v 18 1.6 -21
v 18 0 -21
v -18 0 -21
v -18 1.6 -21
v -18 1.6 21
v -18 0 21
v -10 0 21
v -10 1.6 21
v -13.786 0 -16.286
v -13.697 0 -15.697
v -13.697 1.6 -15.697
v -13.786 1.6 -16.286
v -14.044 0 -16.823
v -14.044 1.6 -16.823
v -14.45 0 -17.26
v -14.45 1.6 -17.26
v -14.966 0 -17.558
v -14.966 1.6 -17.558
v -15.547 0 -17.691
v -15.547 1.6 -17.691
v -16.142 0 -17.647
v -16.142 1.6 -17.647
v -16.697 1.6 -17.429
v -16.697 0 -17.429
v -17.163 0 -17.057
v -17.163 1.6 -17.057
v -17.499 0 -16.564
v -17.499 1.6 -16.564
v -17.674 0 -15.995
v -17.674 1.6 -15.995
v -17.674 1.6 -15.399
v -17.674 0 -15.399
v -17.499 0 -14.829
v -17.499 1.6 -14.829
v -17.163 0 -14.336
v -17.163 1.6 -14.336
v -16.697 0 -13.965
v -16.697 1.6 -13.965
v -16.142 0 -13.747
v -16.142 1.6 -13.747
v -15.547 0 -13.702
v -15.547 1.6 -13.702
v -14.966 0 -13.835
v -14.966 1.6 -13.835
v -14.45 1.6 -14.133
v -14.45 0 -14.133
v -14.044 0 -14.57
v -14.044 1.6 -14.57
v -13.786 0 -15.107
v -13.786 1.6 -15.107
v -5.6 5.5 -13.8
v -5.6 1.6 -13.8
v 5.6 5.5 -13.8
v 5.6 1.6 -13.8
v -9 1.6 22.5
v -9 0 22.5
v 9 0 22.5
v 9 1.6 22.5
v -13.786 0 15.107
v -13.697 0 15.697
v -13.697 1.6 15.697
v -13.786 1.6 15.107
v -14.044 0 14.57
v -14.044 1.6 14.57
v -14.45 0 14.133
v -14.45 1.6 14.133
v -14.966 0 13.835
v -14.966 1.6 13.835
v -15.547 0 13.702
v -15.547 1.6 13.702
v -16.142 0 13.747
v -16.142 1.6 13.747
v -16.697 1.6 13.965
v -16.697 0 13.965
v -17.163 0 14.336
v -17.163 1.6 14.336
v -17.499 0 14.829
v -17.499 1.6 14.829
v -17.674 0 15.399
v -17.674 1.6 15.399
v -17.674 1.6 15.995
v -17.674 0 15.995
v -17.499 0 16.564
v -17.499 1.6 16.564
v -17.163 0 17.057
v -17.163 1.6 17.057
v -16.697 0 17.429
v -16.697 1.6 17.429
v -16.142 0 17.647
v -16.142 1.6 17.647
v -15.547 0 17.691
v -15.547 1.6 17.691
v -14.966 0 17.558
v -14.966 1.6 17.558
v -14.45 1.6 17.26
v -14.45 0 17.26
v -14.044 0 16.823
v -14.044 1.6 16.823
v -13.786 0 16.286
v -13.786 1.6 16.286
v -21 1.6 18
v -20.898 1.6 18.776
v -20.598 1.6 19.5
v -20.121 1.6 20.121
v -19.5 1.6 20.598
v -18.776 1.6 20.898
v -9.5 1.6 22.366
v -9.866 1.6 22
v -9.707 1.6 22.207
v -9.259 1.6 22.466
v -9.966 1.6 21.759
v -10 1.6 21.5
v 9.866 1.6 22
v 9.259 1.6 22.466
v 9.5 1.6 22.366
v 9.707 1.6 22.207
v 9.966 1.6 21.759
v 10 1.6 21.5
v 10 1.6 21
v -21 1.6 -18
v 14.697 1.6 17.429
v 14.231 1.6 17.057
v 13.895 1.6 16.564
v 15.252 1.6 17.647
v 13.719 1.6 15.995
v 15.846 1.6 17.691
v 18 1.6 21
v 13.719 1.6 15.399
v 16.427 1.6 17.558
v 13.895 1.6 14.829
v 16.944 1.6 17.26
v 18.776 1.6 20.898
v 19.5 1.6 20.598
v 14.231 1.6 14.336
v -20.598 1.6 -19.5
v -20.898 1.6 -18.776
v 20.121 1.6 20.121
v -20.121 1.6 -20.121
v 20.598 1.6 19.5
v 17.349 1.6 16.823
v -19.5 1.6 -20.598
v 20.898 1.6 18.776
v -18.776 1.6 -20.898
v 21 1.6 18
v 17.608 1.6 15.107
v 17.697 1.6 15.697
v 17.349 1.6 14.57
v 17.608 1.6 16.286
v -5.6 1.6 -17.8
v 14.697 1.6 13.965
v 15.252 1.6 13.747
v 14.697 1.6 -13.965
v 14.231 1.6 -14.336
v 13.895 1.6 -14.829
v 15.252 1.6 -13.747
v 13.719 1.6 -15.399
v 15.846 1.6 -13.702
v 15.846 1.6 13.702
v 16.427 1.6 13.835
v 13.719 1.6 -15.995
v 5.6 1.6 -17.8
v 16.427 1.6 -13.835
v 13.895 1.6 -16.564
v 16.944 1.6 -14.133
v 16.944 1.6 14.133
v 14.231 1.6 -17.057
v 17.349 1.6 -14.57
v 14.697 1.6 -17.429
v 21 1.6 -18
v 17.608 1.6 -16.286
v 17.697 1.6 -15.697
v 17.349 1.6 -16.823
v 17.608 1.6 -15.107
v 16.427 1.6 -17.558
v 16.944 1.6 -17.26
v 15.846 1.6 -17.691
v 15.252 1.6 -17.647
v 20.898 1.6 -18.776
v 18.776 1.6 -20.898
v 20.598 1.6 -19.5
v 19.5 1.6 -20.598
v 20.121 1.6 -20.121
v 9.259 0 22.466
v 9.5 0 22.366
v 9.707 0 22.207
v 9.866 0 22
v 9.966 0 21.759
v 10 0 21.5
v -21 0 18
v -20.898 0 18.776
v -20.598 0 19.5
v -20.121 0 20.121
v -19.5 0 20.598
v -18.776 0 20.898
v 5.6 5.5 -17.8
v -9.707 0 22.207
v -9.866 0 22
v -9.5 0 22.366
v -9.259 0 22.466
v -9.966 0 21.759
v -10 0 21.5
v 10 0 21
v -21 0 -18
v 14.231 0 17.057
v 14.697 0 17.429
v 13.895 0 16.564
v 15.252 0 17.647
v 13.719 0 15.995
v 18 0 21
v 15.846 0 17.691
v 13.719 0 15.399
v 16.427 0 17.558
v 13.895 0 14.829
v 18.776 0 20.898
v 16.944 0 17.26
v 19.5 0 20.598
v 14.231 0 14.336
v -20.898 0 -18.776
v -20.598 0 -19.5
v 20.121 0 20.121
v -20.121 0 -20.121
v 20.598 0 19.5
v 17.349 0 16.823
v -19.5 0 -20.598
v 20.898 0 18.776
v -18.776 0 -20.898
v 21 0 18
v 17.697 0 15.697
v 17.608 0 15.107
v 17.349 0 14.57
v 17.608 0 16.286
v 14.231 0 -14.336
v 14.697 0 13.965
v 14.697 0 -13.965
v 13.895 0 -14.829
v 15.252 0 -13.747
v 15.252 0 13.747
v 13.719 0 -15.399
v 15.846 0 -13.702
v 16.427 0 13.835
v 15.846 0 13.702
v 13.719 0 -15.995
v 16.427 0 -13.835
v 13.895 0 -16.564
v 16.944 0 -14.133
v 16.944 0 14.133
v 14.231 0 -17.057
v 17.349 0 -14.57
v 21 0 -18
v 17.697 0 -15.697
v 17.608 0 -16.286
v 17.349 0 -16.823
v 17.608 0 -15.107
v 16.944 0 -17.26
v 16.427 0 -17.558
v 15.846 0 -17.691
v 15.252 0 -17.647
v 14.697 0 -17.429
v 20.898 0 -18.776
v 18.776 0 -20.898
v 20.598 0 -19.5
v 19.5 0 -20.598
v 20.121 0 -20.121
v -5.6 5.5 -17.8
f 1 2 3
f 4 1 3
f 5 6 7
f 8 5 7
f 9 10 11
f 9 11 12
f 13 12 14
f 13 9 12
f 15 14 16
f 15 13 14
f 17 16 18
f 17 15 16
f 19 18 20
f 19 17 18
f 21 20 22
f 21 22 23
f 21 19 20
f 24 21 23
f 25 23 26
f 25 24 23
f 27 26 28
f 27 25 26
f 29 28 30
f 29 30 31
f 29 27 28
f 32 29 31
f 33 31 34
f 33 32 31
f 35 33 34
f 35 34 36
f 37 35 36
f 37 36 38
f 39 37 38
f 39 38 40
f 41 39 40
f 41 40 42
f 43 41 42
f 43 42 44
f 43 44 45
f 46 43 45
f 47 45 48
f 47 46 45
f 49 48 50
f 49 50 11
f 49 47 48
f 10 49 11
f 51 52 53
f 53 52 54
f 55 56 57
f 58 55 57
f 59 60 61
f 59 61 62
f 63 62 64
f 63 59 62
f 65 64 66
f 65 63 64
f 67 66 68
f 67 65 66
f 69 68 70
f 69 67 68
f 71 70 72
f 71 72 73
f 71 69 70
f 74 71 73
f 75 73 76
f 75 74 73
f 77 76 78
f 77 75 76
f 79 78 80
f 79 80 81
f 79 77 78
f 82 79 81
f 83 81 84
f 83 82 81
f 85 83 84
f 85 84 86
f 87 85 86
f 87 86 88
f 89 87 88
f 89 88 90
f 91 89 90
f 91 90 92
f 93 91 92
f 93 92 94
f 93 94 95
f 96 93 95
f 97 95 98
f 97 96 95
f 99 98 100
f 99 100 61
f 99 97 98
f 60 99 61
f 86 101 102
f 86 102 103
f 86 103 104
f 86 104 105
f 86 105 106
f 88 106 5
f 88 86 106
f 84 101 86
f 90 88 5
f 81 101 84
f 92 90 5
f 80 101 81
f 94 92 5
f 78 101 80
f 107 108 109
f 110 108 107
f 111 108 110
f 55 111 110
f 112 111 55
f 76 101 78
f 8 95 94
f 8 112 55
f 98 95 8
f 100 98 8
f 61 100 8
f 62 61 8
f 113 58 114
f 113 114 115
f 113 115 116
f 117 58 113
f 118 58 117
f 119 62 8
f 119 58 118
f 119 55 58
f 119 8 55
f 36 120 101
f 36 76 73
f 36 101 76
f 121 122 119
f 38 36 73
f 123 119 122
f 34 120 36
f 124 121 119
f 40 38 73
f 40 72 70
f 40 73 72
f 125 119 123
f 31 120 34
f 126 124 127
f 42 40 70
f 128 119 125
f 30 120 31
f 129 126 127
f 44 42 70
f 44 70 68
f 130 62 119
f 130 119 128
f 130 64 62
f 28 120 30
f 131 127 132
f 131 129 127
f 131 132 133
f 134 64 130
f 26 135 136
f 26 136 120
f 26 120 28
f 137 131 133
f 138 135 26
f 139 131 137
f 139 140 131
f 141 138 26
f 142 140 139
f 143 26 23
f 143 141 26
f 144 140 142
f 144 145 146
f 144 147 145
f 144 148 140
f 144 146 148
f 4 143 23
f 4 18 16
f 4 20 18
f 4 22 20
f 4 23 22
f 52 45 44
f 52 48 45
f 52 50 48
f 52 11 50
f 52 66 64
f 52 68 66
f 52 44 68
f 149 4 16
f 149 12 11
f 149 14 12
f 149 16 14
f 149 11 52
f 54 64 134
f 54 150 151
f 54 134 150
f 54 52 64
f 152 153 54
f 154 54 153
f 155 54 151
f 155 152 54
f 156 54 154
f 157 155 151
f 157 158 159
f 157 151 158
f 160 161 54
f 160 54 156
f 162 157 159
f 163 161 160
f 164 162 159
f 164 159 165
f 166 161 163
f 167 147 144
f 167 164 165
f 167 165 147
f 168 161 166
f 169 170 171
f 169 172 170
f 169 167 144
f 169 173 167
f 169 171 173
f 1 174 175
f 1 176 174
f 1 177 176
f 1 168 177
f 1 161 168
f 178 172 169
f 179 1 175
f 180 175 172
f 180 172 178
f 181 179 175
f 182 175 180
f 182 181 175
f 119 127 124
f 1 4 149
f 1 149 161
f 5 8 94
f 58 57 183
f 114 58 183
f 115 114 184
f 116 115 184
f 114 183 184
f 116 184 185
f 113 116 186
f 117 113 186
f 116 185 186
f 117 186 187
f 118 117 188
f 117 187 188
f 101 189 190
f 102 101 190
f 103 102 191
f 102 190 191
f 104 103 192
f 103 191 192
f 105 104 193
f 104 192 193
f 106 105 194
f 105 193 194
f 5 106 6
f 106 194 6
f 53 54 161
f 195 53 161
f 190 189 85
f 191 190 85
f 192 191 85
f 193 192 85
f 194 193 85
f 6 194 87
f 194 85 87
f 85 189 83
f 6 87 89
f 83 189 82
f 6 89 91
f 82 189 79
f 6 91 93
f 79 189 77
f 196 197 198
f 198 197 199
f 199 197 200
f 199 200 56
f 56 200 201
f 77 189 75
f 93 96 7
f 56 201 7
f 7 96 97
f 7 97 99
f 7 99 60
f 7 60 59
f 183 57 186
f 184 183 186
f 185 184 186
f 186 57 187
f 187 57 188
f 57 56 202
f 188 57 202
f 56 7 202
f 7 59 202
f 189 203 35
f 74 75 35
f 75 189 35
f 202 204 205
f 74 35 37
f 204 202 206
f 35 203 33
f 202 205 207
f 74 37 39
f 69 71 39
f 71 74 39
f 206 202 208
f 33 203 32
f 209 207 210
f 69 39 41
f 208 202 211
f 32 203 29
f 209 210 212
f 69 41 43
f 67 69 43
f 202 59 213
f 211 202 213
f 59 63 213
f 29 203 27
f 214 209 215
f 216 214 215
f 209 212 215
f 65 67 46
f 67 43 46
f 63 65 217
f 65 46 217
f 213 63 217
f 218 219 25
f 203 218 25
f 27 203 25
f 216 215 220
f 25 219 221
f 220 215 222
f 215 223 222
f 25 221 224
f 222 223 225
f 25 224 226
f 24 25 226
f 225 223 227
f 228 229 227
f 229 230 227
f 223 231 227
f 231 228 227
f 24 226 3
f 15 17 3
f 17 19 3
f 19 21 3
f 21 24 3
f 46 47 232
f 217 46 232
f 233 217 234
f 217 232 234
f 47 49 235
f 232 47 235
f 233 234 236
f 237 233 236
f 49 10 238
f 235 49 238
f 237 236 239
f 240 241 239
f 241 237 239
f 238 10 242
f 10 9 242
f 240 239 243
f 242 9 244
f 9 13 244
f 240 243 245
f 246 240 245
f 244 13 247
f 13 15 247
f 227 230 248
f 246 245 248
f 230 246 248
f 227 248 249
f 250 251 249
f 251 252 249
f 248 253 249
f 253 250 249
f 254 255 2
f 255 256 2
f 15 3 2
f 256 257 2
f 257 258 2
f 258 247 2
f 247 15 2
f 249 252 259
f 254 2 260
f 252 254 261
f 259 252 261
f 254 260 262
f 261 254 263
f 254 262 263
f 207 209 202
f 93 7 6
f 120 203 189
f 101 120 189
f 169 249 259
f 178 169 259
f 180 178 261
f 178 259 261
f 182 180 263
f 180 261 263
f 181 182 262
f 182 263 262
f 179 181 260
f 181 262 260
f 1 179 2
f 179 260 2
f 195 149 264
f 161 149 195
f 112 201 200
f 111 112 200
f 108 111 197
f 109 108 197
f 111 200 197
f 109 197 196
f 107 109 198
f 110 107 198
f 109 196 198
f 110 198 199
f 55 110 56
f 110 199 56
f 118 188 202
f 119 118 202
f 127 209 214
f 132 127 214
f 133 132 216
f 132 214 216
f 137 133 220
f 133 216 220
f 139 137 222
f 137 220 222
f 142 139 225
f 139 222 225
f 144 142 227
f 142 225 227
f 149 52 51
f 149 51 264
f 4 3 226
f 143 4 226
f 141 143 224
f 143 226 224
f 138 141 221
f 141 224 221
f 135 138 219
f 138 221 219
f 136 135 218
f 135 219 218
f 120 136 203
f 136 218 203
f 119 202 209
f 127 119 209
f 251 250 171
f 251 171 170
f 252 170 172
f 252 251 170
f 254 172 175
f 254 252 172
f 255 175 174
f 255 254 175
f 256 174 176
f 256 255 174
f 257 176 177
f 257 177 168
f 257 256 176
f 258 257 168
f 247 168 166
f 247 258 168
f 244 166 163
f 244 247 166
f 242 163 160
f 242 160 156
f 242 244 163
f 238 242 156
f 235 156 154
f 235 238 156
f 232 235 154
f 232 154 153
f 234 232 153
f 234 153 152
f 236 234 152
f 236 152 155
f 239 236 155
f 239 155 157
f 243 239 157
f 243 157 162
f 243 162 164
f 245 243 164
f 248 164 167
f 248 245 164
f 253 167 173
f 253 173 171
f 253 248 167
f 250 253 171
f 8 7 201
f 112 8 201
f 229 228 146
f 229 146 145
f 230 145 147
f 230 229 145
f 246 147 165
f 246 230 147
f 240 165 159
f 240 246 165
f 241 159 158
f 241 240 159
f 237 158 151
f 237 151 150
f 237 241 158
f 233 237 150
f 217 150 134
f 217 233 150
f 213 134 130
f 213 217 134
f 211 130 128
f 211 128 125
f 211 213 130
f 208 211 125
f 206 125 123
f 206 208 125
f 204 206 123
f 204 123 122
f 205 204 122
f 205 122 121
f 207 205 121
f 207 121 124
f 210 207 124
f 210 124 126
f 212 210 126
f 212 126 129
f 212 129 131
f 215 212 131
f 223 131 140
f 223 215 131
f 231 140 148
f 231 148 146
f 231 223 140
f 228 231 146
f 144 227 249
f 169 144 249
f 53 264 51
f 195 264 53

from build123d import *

# Parameters (mm, degrees)
DODANIE_WYCI_GNI_CIE1_DEPTH = 1.6
SZKIC2_3_R                  = 2
WYTNIJ_WYCI_GNI_CIE1_DEPTH  = 1.6
SZKIC3_W                    = 11.2
SZKIC3_H                    = 4
DODANIE_WYCI_GNI_CIE2_DEPTH = 3.9


with BuildPart() as part:
    # Szkic2 → Dodanie-wyci_gni_cie1 (new body)
    with BuildSketch(Plane(origin=(0, 0, 0), x_dir=(1, 0, 0), z_dir=(0, 1, 0))):
        with BuildLine():
            Line((-10, -21), (-10, -21.5))
            ThreePointArc((-10, -21.5), (-9.707106781, -22.207106781), (-9, -22.5))
            Line((-9, -22.5), (9, -22.5))
            ThreePointArc((9, -22.5), (9.707106781, -22.207106781), (10, -21.5))
            Line((10, -21.5), (10, -21))
            Line((10, -21), (18, -21))
            ThreePointArc((18, -21), (20.121320344, -20.121320344), (21, -18))
            Line((21, -18), (21, 18))
            ThreePointArc((21, 18), (20.121320344, 20.121320344), (18, 21))
            Line((18, 21), (-18, 21))
            ThreePointArc((-18, 21), (-20.121320344, 20.121320344), (-21, 18))
            Line((-21, 18), (-21, -18))
            ThreePointArc((-21, -18), (-20.121320344, -20.121320344), (-18, -21))
            Line((-18, -21), (-10, -21))
        make_face()
    extrude(amount=DODANIE_WYCI_GNI_CIE1_DEPTH)

    # Szkic2_3 → Wytnij-wyci_gni_cie1 (cut)
    with BuildSketch(Plane(origin=(0, 0, 0), x_dir=(1, 0, 0), z_dir=(0, 1, 0))):
        with Locations((15.696699141, 15.696699141)):
            Circle(SZKIC2_3_R)
        with Locations((-15.696699141, 15.696699141)):
            Circle(SZKIC2_3_R)
        with Locations((15.696699141, -15.696699141)):
            Circle(SZKIC2_3_R)
        with Locations((-15.696699141, -15.696699141)):
            Circle(SZKIC2_3_R)
    extrude(amount=WYTNIJ_WYCI_GNI_CIE1_DEPTH, mode=Mode.SUBTRACT)

    # Szkic3 → Dodanie-wyci_gni_cie2 (add)
    with BuildSketch(Plane(origin=(0, 1.6, 0), x_dir=(1, 0, 0), z_dir=(0, 1, 0))):
        with Locations((0, 15.8)):
            Rectangle(SZKIC3_W, SZKIC3_H)
    extrude(amount=DODANIE_WYCI_GNI_CIE2_DEPTH)


solid = part.part
